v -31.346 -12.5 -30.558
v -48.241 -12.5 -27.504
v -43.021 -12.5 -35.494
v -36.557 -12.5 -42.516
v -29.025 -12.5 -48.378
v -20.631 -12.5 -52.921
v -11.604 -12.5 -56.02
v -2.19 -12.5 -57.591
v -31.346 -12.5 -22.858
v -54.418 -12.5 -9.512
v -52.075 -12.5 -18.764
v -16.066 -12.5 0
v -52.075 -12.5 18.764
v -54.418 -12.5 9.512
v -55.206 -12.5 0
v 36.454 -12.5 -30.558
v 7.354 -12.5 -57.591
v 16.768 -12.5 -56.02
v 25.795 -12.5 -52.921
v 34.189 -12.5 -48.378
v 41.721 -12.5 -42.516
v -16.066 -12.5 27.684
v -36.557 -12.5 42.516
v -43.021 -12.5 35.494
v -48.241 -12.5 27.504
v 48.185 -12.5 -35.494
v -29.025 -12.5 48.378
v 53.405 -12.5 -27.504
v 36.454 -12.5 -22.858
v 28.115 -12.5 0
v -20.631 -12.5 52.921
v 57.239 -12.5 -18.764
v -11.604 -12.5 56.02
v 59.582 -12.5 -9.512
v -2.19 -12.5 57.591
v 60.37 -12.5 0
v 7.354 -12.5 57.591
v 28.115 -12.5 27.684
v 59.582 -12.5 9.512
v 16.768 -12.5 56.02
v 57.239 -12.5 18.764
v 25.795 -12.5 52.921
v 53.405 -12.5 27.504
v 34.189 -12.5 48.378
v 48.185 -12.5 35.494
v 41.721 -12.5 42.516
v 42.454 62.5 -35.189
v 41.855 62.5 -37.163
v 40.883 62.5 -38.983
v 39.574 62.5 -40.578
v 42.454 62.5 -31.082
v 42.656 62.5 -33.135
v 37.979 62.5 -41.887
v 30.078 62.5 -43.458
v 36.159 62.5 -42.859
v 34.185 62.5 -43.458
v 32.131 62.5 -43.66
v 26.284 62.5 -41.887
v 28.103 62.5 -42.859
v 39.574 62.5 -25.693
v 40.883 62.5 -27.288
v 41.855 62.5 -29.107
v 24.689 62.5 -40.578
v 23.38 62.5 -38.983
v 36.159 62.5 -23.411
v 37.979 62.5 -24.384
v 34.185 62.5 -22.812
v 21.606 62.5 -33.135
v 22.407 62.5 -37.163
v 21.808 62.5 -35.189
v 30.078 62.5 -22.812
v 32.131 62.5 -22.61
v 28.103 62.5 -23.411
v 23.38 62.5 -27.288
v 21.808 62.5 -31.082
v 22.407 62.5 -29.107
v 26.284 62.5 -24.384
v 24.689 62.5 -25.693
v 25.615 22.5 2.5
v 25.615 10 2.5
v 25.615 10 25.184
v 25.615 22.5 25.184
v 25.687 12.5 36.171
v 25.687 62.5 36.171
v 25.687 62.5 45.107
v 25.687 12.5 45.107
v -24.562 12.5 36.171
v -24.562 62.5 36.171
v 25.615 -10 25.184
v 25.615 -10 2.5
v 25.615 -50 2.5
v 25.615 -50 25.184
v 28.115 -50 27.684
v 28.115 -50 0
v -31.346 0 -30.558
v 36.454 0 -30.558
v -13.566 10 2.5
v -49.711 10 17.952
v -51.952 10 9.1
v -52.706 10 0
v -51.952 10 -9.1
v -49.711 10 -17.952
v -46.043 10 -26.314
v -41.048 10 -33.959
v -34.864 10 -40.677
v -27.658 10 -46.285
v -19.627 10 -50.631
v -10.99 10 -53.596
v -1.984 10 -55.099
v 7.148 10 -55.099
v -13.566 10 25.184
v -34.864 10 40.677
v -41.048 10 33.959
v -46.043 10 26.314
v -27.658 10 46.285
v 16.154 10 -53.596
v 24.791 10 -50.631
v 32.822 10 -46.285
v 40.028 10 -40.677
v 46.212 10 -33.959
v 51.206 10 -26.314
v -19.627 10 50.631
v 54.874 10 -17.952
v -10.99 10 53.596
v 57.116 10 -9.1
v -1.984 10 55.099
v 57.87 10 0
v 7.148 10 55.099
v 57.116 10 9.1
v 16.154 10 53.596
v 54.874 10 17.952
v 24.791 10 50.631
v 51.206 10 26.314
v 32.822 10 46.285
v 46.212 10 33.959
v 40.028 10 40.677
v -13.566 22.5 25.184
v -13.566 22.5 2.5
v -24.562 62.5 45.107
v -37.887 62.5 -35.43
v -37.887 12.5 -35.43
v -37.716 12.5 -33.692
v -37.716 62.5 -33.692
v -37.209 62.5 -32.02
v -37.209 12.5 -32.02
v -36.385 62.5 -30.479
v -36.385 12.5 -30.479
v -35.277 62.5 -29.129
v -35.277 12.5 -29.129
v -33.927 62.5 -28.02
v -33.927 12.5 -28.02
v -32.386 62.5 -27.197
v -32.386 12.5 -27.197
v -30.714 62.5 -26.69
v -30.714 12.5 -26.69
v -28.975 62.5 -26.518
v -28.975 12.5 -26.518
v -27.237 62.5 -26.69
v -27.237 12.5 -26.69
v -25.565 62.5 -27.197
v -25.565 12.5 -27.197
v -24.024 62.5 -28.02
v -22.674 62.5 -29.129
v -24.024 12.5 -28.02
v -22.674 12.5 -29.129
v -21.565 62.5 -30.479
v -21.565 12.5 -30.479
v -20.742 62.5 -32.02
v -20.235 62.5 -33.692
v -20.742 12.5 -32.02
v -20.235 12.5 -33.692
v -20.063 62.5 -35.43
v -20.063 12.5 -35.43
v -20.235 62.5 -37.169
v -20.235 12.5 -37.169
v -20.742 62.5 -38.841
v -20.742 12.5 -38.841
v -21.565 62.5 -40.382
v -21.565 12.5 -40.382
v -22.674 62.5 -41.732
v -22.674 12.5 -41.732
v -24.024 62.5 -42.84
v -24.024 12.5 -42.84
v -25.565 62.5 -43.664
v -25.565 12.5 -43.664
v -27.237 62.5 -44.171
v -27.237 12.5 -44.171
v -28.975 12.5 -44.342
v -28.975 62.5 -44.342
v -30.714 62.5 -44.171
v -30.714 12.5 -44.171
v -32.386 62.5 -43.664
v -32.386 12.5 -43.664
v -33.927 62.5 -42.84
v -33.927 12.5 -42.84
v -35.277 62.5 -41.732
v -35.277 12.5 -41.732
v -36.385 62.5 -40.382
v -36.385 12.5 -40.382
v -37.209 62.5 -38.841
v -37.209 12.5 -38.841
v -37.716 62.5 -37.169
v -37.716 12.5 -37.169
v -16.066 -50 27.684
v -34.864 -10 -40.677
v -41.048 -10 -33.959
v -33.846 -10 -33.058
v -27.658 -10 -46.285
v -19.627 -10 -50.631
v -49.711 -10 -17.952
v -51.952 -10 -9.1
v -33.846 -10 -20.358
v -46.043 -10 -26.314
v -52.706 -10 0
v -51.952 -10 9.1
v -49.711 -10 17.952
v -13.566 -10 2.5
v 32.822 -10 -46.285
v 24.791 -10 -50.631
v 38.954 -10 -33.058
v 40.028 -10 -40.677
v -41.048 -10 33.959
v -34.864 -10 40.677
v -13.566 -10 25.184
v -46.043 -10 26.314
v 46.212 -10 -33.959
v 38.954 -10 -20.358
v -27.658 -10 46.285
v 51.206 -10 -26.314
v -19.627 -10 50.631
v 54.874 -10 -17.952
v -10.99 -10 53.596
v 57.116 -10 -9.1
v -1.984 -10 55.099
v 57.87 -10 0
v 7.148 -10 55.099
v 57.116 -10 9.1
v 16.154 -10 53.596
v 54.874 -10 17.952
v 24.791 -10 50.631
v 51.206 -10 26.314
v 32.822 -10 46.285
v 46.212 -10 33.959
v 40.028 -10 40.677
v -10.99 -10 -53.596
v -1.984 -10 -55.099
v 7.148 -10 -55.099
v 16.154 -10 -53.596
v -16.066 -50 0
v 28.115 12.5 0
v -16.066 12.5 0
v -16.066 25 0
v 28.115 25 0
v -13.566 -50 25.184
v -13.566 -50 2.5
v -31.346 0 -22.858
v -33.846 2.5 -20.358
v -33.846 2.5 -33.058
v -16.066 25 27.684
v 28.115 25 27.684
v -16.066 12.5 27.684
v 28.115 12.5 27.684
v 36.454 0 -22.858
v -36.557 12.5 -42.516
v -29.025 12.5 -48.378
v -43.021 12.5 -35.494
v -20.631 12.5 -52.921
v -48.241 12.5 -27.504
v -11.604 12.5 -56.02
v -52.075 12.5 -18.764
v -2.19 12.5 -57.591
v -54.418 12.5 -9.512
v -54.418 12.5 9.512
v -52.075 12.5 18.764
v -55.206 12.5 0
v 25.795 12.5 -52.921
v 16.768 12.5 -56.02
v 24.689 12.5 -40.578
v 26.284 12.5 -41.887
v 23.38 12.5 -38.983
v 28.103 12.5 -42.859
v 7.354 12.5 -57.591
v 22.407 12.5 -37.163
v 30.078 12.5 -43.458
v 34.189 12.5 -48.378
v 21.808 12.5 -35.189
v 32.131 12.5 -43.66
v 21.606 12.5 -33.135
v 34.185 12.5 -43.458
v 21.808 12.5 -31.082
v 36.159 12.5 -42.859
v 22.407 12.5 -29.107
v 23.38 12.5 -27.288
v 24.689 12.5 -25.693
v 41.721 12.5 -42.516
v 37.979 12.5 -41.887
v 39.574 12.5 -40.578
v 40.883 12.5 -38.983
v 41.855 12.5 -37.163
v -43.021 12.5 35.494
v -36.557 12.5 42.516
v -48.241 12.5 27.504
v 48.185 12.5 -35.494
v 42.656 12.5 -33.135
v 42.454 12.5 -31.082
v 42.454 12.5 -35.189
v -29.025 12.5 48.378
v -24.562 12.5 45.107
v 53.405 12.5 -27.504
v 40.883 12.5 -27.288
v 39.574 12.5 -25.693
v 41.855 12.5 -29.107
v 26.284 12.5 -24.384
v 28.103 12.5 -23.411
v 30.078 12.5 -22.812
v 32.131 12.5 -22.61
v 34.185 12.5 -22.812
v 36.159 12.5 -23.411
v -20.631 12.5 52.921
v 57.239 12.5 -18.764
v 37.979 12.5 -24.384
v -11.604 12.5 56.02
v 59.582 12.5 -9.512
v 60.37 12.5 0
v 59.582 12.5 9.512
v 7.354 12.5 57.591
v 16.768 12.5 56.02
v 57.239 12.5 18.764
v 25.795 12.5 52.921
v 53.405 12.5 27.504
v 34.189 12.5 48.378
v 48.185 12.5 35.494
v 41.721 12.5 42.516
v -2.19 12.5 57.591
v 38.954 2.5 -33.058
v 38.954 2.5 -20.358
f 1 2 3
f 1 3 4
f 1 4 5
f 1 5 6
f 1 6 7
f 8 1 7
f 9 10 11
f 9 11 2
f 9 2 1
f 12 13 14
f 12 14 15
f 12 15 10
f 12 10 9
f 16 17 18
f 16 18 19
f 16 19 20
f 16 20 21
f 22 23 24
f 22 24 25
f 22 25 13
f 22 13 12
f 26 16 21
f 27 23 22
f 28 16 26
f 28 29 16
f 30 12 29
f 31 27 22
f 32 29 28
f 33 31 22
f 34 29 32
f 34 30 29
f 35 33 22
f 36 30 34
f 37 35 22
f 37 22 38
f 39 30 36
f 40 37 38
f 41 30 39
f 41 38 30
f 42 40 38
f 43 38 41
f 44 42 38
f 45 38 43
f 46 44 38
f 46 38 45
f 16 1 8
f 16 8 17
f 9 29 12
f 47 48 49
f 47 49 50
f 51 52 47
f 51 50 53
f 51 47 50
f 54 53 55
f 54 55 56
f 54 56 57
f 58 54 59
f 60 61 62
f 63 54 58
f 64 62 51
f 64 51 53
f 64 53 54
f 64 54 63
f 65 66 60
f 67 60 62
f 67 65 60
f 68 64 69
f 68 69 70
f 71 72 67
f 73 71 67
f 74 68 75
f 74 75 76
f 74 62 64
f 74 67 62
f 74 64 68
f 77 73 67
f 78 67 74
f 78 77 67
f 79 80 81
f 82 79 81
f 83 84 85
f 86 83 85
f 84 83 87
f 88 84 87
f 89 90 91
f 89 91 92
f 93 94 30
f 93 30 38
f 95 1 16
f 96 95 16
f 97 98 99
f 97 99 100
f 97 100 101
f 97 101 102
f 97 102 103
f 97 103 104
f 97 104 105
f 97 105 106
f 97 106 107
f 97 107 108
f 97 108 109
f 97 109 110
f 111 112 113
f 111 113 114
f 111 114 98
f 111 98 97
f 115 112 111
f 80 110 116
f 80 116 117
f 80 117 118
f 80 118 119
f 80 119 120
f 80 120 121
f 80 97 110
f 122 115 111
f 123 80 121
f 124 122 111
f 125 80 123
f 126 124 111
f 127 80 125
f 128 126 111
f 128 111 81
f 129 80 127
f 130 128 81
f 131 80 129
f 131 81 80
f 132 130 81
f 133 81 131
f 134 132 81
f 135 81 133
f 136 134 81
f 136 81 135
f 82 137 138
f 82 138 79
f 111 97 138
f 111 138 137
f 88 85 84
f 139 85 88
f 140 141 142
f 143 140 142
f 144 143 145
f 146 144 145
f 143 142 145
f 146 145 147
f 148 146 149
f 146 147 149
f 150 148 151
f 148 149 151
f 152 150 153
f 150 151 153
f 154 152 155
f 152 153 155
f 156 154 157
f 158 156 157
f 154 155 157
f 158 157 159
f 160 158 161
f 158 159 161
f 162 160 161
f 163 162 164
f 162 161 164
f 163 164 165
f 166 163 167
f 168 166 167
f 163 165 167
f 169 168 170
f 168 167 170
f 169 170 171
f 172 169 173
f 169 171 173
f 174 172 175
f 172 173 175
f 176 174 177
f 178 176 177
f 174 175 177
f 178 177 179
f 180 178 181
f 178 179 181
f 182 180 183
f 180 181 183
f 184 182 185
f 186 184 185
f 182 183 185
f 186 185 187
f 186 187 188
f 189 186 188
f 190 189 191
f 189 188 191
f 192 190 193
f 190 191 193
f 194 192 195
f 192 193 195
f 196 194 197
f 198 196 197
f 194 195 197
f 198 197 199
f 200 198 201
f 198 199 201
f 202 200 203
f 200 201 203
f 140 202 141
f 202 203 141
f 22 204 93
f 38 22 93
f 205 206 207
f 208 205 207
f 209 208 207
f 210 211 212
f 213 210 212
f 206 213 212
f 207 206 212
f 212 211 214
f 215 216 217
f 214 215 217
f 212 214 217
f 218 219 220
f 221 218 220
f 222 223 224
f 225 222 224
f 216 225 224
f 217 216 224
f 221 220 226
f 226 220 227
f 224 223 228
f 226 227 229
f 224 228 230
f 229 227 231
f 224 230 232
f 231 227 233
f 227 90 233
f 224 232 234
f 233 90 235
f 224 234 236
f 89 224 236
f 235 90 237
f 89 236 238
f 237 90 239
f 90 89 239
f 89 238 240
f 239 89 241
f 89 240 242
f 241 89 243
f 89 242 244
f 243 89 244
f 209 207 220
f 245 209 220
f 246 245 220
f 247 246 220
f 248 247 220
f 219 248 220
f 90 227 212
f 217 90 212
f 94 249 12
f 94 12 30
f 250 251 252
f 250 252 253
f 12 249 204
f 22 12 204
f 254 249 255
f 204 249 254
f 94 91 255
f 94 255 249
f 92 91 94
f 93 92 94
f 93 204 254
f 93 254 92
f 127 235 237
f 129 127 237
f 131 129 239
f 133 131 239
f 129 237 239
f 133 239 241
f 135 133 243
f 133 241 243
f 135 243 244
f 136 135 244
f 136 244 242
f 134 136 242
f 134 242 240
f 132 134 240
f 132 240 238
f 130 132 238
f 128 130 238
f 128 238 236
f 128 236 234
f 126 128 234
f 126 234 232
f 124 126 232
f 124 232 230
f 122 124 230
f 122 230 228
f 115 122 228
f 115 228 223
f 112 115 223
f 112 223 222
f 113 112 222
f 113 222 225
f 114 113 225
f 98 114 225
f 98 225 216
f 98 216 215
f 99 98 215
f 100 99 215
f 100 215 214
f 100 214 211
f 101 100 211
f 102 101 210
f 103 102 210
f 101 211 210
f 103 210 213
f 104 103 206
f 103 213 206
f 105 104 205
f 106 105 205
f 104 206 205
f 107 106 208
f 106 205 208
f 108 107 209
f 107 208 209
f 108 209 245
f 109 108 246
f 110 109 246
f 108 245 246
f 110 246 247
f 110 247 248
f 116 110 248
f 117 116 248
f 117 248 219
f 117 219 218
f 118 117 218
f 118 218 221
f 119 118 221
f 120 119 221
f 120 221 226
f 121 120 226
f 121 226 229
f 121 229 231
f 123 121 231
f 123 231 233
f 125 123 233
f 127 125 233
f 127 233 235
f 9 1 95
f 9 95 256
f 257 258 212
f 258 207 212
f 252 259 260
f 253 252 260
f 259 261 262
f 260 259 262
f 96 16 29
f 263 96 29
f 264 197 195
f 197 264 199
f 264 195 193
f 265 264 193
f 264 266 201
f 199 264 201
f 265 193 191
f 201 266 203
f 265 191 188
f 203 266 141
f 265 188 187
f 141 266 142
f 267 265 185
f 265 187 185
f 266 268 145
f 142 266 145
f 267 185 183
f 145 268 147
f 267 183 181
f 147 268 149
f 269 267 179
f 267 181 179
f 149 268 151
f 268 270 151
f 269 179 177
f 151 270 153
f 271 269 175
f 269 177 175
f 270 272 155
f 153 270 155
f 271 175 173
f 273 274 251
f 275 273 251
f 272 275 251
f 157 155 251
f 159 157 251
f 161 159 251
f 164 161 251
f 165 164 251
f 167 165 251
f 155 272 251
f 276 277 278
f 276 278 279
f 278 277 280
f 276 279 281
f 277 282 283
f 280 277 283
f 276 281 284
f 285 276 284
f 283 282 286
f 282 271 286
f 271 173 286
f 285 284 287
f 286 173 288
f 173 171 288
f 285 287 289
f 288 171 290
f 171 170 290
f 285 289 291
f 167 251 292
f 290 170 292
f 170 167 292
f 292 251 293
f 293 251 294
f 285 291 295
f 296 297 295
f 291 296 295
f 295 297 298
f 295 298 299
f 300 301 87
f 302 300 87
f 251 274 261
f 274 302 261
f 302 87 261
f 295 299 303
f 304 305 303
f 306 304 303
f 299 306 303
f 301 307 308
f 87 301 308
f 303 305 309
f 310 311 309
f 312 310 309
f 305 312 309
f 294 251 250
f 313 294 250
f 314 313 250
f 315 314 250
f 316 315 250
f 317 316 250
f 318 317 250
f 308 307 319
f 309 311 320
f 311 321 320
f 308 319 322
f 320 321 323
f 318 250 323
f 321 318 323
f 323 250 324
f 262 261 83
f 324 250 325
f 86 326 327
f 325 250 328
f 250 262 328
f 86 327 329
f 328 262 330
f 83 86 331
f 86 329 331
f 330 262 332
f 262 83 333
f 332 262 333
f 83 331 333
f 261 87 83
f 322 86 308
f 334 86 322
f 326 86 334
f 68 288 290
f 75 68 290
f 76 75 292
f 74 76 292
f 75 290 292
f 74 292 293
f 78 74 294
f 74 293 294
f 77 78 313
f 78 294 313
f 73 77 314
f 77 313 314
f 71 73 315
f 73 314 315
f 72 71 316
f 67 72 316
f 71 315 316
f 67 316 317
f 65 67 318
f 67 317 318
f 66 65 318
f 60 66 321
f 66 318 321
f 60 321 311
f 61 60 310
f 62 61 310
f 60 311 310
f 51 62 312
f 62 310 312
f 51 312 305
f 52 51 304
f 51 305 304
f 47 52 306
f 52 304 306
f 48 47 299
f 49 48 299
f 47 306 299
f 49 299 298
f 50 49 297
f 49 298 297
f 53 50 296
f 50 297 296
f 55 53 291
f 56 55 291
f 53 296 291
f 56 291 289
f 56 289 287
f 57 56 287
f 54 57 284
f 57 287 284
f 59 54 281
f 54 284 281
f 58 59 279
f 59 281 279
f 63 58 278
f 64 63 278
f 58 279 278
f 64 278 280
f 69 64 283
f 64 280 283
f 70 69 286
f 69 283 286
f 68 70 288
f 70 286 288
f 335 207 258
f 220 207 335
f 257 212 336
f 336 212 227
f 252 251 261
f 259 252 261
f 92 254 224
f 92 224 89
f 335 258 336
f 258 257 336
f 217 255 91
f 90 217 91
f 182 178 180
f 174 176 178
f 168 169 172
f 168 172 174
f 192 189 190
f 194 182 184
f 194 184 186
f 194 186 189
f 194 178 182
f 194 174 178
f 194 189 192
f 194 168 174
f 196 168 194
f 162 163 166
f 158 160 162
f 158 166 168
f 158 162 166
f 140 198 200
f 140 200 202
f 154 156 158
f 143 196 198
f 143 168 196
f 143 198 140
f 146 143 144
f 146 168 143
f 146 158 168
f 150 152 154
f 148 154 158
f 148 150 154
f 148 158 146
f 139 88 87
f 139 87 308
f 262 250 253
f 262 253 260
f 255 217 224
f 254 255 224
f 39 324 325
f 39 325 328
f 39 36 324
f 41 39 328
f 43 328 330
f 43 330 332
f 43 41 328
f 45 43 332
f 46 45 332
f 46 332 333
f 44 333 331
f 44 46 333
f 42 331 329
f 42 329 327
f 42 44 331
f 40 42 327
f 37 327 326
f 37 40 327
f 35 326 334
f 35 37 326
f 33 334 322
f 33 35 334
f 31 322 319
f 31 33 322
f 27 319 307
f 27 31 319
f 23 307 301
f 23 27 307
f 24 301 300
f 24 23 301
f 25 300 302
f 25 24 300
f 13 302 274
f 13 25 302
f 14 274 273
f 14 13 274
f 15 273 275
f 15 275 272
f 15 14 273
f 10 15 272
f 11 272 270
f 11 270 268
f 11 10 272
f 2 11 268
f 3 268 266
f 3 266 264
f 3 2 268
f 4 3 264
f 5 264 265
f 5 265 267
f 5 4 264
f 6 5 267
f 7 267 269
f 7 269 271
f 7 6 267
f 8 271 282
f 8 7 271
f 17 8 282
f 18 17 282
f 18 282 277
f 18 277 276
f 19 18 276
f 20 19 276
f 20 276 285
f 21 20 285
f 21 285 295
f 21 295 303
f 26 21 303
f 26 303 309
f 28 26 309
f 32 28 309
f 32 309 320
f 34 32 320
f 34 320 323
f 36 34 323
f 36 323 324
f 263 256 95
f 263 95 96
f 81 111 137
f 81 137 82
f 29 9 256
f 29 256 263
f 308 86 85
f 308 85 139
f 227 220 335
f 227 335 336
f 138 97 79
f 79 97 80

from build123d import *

# Parameters (mm, degrees)
F0_R      = 57.7881585004
F1_DEPTH  = 12.5
F2_W      = 44.1803280264
F2_H      = 27.6844277978
F4_DEPTH  = 37.5
F3_W      = 67.8
F3_H      = 7.7
F5_DEPTH  = 12.5
F6_T      = -2.5
F7_W      = 50.2489116043
F7_H      = 8.9359693229
F8_DEPTH  = 50
F10_R     = 10.5252112218
F11_DEPTH = 50
F9_R      = 8.9119309546
F12_DEPTH = 50


with BuildPart() as f1:
    # F0 (on Front) → F1 (new body, symmetric)
    with BuildSketch(Plane.XZ):
        with Locations((2.5819686707, 0)):
            Circle(F0_R)
    extrude(amount=F1_DEPTH, both=True)

    # F2 (on face) → F4 (join, symmetric)
    with BuildSketch(Plane.XZ.offset(12.5)):
        with Locations((6.0245888308, 13.8422138989)):
            Rectangle(F2_W, F2_H)
    extrude(amount=F4_DEPTH, both=True)

    # F3 (on face) → F5 (cut, symmetric)
    with BuildSketch(Plane.XZ.offset(12.5)):
        with Locations((2.5539135873, -26.7082657456)):
            Rectangle(F3_W, F3_H)
    extrude(amount=F5_DEPTH, both=True, mode=Mode.SUBTRACT)

    # F6
    f6_openings = [f1.faces().sort_by_distance(p)[0] for p in [
        (6.024589, -50, 13.842214),
    ]]
    offset(amount=F6_T, openings=f6_openings, kind=Kind.INTERSECTION)

    # F7 (on face) → F8 (join)
    with BuildSketch(Plane(origin=(0, 12.5, 0), x_dir=(-1, 0, 0), z_dir=(0, 1, 0))):
        with Locations((-0.5627823994, 40.6393650919)):
            Rectangle(F7_W, F7_H)
    extrude(amount=F8_DEPTH)

    # F10 (on face) → F11 (join)
    with BuildSketch(Plane(origin=(0, 12.5, 0), x_dir=(-1, 0, 0), z_dir=(0, 1, 0))):
        with Locations((-32.1311503649, -33.1352464855)):
            Circle(F10_R)
    extrude(amount=F11_DEPTH)

    # F9 (on face) → F12 (join)
    with BuildSketch(Plane(origin=(0, 12.5, 0), x_dir=(-1, 0, 0), z_dir=(0, 1, 0))):
        with Locations((28.9754085243, -35.4303270578)):
            Circle(F9_R)
    extrude(amount=F12_DEPTH)


solid = f1.part
